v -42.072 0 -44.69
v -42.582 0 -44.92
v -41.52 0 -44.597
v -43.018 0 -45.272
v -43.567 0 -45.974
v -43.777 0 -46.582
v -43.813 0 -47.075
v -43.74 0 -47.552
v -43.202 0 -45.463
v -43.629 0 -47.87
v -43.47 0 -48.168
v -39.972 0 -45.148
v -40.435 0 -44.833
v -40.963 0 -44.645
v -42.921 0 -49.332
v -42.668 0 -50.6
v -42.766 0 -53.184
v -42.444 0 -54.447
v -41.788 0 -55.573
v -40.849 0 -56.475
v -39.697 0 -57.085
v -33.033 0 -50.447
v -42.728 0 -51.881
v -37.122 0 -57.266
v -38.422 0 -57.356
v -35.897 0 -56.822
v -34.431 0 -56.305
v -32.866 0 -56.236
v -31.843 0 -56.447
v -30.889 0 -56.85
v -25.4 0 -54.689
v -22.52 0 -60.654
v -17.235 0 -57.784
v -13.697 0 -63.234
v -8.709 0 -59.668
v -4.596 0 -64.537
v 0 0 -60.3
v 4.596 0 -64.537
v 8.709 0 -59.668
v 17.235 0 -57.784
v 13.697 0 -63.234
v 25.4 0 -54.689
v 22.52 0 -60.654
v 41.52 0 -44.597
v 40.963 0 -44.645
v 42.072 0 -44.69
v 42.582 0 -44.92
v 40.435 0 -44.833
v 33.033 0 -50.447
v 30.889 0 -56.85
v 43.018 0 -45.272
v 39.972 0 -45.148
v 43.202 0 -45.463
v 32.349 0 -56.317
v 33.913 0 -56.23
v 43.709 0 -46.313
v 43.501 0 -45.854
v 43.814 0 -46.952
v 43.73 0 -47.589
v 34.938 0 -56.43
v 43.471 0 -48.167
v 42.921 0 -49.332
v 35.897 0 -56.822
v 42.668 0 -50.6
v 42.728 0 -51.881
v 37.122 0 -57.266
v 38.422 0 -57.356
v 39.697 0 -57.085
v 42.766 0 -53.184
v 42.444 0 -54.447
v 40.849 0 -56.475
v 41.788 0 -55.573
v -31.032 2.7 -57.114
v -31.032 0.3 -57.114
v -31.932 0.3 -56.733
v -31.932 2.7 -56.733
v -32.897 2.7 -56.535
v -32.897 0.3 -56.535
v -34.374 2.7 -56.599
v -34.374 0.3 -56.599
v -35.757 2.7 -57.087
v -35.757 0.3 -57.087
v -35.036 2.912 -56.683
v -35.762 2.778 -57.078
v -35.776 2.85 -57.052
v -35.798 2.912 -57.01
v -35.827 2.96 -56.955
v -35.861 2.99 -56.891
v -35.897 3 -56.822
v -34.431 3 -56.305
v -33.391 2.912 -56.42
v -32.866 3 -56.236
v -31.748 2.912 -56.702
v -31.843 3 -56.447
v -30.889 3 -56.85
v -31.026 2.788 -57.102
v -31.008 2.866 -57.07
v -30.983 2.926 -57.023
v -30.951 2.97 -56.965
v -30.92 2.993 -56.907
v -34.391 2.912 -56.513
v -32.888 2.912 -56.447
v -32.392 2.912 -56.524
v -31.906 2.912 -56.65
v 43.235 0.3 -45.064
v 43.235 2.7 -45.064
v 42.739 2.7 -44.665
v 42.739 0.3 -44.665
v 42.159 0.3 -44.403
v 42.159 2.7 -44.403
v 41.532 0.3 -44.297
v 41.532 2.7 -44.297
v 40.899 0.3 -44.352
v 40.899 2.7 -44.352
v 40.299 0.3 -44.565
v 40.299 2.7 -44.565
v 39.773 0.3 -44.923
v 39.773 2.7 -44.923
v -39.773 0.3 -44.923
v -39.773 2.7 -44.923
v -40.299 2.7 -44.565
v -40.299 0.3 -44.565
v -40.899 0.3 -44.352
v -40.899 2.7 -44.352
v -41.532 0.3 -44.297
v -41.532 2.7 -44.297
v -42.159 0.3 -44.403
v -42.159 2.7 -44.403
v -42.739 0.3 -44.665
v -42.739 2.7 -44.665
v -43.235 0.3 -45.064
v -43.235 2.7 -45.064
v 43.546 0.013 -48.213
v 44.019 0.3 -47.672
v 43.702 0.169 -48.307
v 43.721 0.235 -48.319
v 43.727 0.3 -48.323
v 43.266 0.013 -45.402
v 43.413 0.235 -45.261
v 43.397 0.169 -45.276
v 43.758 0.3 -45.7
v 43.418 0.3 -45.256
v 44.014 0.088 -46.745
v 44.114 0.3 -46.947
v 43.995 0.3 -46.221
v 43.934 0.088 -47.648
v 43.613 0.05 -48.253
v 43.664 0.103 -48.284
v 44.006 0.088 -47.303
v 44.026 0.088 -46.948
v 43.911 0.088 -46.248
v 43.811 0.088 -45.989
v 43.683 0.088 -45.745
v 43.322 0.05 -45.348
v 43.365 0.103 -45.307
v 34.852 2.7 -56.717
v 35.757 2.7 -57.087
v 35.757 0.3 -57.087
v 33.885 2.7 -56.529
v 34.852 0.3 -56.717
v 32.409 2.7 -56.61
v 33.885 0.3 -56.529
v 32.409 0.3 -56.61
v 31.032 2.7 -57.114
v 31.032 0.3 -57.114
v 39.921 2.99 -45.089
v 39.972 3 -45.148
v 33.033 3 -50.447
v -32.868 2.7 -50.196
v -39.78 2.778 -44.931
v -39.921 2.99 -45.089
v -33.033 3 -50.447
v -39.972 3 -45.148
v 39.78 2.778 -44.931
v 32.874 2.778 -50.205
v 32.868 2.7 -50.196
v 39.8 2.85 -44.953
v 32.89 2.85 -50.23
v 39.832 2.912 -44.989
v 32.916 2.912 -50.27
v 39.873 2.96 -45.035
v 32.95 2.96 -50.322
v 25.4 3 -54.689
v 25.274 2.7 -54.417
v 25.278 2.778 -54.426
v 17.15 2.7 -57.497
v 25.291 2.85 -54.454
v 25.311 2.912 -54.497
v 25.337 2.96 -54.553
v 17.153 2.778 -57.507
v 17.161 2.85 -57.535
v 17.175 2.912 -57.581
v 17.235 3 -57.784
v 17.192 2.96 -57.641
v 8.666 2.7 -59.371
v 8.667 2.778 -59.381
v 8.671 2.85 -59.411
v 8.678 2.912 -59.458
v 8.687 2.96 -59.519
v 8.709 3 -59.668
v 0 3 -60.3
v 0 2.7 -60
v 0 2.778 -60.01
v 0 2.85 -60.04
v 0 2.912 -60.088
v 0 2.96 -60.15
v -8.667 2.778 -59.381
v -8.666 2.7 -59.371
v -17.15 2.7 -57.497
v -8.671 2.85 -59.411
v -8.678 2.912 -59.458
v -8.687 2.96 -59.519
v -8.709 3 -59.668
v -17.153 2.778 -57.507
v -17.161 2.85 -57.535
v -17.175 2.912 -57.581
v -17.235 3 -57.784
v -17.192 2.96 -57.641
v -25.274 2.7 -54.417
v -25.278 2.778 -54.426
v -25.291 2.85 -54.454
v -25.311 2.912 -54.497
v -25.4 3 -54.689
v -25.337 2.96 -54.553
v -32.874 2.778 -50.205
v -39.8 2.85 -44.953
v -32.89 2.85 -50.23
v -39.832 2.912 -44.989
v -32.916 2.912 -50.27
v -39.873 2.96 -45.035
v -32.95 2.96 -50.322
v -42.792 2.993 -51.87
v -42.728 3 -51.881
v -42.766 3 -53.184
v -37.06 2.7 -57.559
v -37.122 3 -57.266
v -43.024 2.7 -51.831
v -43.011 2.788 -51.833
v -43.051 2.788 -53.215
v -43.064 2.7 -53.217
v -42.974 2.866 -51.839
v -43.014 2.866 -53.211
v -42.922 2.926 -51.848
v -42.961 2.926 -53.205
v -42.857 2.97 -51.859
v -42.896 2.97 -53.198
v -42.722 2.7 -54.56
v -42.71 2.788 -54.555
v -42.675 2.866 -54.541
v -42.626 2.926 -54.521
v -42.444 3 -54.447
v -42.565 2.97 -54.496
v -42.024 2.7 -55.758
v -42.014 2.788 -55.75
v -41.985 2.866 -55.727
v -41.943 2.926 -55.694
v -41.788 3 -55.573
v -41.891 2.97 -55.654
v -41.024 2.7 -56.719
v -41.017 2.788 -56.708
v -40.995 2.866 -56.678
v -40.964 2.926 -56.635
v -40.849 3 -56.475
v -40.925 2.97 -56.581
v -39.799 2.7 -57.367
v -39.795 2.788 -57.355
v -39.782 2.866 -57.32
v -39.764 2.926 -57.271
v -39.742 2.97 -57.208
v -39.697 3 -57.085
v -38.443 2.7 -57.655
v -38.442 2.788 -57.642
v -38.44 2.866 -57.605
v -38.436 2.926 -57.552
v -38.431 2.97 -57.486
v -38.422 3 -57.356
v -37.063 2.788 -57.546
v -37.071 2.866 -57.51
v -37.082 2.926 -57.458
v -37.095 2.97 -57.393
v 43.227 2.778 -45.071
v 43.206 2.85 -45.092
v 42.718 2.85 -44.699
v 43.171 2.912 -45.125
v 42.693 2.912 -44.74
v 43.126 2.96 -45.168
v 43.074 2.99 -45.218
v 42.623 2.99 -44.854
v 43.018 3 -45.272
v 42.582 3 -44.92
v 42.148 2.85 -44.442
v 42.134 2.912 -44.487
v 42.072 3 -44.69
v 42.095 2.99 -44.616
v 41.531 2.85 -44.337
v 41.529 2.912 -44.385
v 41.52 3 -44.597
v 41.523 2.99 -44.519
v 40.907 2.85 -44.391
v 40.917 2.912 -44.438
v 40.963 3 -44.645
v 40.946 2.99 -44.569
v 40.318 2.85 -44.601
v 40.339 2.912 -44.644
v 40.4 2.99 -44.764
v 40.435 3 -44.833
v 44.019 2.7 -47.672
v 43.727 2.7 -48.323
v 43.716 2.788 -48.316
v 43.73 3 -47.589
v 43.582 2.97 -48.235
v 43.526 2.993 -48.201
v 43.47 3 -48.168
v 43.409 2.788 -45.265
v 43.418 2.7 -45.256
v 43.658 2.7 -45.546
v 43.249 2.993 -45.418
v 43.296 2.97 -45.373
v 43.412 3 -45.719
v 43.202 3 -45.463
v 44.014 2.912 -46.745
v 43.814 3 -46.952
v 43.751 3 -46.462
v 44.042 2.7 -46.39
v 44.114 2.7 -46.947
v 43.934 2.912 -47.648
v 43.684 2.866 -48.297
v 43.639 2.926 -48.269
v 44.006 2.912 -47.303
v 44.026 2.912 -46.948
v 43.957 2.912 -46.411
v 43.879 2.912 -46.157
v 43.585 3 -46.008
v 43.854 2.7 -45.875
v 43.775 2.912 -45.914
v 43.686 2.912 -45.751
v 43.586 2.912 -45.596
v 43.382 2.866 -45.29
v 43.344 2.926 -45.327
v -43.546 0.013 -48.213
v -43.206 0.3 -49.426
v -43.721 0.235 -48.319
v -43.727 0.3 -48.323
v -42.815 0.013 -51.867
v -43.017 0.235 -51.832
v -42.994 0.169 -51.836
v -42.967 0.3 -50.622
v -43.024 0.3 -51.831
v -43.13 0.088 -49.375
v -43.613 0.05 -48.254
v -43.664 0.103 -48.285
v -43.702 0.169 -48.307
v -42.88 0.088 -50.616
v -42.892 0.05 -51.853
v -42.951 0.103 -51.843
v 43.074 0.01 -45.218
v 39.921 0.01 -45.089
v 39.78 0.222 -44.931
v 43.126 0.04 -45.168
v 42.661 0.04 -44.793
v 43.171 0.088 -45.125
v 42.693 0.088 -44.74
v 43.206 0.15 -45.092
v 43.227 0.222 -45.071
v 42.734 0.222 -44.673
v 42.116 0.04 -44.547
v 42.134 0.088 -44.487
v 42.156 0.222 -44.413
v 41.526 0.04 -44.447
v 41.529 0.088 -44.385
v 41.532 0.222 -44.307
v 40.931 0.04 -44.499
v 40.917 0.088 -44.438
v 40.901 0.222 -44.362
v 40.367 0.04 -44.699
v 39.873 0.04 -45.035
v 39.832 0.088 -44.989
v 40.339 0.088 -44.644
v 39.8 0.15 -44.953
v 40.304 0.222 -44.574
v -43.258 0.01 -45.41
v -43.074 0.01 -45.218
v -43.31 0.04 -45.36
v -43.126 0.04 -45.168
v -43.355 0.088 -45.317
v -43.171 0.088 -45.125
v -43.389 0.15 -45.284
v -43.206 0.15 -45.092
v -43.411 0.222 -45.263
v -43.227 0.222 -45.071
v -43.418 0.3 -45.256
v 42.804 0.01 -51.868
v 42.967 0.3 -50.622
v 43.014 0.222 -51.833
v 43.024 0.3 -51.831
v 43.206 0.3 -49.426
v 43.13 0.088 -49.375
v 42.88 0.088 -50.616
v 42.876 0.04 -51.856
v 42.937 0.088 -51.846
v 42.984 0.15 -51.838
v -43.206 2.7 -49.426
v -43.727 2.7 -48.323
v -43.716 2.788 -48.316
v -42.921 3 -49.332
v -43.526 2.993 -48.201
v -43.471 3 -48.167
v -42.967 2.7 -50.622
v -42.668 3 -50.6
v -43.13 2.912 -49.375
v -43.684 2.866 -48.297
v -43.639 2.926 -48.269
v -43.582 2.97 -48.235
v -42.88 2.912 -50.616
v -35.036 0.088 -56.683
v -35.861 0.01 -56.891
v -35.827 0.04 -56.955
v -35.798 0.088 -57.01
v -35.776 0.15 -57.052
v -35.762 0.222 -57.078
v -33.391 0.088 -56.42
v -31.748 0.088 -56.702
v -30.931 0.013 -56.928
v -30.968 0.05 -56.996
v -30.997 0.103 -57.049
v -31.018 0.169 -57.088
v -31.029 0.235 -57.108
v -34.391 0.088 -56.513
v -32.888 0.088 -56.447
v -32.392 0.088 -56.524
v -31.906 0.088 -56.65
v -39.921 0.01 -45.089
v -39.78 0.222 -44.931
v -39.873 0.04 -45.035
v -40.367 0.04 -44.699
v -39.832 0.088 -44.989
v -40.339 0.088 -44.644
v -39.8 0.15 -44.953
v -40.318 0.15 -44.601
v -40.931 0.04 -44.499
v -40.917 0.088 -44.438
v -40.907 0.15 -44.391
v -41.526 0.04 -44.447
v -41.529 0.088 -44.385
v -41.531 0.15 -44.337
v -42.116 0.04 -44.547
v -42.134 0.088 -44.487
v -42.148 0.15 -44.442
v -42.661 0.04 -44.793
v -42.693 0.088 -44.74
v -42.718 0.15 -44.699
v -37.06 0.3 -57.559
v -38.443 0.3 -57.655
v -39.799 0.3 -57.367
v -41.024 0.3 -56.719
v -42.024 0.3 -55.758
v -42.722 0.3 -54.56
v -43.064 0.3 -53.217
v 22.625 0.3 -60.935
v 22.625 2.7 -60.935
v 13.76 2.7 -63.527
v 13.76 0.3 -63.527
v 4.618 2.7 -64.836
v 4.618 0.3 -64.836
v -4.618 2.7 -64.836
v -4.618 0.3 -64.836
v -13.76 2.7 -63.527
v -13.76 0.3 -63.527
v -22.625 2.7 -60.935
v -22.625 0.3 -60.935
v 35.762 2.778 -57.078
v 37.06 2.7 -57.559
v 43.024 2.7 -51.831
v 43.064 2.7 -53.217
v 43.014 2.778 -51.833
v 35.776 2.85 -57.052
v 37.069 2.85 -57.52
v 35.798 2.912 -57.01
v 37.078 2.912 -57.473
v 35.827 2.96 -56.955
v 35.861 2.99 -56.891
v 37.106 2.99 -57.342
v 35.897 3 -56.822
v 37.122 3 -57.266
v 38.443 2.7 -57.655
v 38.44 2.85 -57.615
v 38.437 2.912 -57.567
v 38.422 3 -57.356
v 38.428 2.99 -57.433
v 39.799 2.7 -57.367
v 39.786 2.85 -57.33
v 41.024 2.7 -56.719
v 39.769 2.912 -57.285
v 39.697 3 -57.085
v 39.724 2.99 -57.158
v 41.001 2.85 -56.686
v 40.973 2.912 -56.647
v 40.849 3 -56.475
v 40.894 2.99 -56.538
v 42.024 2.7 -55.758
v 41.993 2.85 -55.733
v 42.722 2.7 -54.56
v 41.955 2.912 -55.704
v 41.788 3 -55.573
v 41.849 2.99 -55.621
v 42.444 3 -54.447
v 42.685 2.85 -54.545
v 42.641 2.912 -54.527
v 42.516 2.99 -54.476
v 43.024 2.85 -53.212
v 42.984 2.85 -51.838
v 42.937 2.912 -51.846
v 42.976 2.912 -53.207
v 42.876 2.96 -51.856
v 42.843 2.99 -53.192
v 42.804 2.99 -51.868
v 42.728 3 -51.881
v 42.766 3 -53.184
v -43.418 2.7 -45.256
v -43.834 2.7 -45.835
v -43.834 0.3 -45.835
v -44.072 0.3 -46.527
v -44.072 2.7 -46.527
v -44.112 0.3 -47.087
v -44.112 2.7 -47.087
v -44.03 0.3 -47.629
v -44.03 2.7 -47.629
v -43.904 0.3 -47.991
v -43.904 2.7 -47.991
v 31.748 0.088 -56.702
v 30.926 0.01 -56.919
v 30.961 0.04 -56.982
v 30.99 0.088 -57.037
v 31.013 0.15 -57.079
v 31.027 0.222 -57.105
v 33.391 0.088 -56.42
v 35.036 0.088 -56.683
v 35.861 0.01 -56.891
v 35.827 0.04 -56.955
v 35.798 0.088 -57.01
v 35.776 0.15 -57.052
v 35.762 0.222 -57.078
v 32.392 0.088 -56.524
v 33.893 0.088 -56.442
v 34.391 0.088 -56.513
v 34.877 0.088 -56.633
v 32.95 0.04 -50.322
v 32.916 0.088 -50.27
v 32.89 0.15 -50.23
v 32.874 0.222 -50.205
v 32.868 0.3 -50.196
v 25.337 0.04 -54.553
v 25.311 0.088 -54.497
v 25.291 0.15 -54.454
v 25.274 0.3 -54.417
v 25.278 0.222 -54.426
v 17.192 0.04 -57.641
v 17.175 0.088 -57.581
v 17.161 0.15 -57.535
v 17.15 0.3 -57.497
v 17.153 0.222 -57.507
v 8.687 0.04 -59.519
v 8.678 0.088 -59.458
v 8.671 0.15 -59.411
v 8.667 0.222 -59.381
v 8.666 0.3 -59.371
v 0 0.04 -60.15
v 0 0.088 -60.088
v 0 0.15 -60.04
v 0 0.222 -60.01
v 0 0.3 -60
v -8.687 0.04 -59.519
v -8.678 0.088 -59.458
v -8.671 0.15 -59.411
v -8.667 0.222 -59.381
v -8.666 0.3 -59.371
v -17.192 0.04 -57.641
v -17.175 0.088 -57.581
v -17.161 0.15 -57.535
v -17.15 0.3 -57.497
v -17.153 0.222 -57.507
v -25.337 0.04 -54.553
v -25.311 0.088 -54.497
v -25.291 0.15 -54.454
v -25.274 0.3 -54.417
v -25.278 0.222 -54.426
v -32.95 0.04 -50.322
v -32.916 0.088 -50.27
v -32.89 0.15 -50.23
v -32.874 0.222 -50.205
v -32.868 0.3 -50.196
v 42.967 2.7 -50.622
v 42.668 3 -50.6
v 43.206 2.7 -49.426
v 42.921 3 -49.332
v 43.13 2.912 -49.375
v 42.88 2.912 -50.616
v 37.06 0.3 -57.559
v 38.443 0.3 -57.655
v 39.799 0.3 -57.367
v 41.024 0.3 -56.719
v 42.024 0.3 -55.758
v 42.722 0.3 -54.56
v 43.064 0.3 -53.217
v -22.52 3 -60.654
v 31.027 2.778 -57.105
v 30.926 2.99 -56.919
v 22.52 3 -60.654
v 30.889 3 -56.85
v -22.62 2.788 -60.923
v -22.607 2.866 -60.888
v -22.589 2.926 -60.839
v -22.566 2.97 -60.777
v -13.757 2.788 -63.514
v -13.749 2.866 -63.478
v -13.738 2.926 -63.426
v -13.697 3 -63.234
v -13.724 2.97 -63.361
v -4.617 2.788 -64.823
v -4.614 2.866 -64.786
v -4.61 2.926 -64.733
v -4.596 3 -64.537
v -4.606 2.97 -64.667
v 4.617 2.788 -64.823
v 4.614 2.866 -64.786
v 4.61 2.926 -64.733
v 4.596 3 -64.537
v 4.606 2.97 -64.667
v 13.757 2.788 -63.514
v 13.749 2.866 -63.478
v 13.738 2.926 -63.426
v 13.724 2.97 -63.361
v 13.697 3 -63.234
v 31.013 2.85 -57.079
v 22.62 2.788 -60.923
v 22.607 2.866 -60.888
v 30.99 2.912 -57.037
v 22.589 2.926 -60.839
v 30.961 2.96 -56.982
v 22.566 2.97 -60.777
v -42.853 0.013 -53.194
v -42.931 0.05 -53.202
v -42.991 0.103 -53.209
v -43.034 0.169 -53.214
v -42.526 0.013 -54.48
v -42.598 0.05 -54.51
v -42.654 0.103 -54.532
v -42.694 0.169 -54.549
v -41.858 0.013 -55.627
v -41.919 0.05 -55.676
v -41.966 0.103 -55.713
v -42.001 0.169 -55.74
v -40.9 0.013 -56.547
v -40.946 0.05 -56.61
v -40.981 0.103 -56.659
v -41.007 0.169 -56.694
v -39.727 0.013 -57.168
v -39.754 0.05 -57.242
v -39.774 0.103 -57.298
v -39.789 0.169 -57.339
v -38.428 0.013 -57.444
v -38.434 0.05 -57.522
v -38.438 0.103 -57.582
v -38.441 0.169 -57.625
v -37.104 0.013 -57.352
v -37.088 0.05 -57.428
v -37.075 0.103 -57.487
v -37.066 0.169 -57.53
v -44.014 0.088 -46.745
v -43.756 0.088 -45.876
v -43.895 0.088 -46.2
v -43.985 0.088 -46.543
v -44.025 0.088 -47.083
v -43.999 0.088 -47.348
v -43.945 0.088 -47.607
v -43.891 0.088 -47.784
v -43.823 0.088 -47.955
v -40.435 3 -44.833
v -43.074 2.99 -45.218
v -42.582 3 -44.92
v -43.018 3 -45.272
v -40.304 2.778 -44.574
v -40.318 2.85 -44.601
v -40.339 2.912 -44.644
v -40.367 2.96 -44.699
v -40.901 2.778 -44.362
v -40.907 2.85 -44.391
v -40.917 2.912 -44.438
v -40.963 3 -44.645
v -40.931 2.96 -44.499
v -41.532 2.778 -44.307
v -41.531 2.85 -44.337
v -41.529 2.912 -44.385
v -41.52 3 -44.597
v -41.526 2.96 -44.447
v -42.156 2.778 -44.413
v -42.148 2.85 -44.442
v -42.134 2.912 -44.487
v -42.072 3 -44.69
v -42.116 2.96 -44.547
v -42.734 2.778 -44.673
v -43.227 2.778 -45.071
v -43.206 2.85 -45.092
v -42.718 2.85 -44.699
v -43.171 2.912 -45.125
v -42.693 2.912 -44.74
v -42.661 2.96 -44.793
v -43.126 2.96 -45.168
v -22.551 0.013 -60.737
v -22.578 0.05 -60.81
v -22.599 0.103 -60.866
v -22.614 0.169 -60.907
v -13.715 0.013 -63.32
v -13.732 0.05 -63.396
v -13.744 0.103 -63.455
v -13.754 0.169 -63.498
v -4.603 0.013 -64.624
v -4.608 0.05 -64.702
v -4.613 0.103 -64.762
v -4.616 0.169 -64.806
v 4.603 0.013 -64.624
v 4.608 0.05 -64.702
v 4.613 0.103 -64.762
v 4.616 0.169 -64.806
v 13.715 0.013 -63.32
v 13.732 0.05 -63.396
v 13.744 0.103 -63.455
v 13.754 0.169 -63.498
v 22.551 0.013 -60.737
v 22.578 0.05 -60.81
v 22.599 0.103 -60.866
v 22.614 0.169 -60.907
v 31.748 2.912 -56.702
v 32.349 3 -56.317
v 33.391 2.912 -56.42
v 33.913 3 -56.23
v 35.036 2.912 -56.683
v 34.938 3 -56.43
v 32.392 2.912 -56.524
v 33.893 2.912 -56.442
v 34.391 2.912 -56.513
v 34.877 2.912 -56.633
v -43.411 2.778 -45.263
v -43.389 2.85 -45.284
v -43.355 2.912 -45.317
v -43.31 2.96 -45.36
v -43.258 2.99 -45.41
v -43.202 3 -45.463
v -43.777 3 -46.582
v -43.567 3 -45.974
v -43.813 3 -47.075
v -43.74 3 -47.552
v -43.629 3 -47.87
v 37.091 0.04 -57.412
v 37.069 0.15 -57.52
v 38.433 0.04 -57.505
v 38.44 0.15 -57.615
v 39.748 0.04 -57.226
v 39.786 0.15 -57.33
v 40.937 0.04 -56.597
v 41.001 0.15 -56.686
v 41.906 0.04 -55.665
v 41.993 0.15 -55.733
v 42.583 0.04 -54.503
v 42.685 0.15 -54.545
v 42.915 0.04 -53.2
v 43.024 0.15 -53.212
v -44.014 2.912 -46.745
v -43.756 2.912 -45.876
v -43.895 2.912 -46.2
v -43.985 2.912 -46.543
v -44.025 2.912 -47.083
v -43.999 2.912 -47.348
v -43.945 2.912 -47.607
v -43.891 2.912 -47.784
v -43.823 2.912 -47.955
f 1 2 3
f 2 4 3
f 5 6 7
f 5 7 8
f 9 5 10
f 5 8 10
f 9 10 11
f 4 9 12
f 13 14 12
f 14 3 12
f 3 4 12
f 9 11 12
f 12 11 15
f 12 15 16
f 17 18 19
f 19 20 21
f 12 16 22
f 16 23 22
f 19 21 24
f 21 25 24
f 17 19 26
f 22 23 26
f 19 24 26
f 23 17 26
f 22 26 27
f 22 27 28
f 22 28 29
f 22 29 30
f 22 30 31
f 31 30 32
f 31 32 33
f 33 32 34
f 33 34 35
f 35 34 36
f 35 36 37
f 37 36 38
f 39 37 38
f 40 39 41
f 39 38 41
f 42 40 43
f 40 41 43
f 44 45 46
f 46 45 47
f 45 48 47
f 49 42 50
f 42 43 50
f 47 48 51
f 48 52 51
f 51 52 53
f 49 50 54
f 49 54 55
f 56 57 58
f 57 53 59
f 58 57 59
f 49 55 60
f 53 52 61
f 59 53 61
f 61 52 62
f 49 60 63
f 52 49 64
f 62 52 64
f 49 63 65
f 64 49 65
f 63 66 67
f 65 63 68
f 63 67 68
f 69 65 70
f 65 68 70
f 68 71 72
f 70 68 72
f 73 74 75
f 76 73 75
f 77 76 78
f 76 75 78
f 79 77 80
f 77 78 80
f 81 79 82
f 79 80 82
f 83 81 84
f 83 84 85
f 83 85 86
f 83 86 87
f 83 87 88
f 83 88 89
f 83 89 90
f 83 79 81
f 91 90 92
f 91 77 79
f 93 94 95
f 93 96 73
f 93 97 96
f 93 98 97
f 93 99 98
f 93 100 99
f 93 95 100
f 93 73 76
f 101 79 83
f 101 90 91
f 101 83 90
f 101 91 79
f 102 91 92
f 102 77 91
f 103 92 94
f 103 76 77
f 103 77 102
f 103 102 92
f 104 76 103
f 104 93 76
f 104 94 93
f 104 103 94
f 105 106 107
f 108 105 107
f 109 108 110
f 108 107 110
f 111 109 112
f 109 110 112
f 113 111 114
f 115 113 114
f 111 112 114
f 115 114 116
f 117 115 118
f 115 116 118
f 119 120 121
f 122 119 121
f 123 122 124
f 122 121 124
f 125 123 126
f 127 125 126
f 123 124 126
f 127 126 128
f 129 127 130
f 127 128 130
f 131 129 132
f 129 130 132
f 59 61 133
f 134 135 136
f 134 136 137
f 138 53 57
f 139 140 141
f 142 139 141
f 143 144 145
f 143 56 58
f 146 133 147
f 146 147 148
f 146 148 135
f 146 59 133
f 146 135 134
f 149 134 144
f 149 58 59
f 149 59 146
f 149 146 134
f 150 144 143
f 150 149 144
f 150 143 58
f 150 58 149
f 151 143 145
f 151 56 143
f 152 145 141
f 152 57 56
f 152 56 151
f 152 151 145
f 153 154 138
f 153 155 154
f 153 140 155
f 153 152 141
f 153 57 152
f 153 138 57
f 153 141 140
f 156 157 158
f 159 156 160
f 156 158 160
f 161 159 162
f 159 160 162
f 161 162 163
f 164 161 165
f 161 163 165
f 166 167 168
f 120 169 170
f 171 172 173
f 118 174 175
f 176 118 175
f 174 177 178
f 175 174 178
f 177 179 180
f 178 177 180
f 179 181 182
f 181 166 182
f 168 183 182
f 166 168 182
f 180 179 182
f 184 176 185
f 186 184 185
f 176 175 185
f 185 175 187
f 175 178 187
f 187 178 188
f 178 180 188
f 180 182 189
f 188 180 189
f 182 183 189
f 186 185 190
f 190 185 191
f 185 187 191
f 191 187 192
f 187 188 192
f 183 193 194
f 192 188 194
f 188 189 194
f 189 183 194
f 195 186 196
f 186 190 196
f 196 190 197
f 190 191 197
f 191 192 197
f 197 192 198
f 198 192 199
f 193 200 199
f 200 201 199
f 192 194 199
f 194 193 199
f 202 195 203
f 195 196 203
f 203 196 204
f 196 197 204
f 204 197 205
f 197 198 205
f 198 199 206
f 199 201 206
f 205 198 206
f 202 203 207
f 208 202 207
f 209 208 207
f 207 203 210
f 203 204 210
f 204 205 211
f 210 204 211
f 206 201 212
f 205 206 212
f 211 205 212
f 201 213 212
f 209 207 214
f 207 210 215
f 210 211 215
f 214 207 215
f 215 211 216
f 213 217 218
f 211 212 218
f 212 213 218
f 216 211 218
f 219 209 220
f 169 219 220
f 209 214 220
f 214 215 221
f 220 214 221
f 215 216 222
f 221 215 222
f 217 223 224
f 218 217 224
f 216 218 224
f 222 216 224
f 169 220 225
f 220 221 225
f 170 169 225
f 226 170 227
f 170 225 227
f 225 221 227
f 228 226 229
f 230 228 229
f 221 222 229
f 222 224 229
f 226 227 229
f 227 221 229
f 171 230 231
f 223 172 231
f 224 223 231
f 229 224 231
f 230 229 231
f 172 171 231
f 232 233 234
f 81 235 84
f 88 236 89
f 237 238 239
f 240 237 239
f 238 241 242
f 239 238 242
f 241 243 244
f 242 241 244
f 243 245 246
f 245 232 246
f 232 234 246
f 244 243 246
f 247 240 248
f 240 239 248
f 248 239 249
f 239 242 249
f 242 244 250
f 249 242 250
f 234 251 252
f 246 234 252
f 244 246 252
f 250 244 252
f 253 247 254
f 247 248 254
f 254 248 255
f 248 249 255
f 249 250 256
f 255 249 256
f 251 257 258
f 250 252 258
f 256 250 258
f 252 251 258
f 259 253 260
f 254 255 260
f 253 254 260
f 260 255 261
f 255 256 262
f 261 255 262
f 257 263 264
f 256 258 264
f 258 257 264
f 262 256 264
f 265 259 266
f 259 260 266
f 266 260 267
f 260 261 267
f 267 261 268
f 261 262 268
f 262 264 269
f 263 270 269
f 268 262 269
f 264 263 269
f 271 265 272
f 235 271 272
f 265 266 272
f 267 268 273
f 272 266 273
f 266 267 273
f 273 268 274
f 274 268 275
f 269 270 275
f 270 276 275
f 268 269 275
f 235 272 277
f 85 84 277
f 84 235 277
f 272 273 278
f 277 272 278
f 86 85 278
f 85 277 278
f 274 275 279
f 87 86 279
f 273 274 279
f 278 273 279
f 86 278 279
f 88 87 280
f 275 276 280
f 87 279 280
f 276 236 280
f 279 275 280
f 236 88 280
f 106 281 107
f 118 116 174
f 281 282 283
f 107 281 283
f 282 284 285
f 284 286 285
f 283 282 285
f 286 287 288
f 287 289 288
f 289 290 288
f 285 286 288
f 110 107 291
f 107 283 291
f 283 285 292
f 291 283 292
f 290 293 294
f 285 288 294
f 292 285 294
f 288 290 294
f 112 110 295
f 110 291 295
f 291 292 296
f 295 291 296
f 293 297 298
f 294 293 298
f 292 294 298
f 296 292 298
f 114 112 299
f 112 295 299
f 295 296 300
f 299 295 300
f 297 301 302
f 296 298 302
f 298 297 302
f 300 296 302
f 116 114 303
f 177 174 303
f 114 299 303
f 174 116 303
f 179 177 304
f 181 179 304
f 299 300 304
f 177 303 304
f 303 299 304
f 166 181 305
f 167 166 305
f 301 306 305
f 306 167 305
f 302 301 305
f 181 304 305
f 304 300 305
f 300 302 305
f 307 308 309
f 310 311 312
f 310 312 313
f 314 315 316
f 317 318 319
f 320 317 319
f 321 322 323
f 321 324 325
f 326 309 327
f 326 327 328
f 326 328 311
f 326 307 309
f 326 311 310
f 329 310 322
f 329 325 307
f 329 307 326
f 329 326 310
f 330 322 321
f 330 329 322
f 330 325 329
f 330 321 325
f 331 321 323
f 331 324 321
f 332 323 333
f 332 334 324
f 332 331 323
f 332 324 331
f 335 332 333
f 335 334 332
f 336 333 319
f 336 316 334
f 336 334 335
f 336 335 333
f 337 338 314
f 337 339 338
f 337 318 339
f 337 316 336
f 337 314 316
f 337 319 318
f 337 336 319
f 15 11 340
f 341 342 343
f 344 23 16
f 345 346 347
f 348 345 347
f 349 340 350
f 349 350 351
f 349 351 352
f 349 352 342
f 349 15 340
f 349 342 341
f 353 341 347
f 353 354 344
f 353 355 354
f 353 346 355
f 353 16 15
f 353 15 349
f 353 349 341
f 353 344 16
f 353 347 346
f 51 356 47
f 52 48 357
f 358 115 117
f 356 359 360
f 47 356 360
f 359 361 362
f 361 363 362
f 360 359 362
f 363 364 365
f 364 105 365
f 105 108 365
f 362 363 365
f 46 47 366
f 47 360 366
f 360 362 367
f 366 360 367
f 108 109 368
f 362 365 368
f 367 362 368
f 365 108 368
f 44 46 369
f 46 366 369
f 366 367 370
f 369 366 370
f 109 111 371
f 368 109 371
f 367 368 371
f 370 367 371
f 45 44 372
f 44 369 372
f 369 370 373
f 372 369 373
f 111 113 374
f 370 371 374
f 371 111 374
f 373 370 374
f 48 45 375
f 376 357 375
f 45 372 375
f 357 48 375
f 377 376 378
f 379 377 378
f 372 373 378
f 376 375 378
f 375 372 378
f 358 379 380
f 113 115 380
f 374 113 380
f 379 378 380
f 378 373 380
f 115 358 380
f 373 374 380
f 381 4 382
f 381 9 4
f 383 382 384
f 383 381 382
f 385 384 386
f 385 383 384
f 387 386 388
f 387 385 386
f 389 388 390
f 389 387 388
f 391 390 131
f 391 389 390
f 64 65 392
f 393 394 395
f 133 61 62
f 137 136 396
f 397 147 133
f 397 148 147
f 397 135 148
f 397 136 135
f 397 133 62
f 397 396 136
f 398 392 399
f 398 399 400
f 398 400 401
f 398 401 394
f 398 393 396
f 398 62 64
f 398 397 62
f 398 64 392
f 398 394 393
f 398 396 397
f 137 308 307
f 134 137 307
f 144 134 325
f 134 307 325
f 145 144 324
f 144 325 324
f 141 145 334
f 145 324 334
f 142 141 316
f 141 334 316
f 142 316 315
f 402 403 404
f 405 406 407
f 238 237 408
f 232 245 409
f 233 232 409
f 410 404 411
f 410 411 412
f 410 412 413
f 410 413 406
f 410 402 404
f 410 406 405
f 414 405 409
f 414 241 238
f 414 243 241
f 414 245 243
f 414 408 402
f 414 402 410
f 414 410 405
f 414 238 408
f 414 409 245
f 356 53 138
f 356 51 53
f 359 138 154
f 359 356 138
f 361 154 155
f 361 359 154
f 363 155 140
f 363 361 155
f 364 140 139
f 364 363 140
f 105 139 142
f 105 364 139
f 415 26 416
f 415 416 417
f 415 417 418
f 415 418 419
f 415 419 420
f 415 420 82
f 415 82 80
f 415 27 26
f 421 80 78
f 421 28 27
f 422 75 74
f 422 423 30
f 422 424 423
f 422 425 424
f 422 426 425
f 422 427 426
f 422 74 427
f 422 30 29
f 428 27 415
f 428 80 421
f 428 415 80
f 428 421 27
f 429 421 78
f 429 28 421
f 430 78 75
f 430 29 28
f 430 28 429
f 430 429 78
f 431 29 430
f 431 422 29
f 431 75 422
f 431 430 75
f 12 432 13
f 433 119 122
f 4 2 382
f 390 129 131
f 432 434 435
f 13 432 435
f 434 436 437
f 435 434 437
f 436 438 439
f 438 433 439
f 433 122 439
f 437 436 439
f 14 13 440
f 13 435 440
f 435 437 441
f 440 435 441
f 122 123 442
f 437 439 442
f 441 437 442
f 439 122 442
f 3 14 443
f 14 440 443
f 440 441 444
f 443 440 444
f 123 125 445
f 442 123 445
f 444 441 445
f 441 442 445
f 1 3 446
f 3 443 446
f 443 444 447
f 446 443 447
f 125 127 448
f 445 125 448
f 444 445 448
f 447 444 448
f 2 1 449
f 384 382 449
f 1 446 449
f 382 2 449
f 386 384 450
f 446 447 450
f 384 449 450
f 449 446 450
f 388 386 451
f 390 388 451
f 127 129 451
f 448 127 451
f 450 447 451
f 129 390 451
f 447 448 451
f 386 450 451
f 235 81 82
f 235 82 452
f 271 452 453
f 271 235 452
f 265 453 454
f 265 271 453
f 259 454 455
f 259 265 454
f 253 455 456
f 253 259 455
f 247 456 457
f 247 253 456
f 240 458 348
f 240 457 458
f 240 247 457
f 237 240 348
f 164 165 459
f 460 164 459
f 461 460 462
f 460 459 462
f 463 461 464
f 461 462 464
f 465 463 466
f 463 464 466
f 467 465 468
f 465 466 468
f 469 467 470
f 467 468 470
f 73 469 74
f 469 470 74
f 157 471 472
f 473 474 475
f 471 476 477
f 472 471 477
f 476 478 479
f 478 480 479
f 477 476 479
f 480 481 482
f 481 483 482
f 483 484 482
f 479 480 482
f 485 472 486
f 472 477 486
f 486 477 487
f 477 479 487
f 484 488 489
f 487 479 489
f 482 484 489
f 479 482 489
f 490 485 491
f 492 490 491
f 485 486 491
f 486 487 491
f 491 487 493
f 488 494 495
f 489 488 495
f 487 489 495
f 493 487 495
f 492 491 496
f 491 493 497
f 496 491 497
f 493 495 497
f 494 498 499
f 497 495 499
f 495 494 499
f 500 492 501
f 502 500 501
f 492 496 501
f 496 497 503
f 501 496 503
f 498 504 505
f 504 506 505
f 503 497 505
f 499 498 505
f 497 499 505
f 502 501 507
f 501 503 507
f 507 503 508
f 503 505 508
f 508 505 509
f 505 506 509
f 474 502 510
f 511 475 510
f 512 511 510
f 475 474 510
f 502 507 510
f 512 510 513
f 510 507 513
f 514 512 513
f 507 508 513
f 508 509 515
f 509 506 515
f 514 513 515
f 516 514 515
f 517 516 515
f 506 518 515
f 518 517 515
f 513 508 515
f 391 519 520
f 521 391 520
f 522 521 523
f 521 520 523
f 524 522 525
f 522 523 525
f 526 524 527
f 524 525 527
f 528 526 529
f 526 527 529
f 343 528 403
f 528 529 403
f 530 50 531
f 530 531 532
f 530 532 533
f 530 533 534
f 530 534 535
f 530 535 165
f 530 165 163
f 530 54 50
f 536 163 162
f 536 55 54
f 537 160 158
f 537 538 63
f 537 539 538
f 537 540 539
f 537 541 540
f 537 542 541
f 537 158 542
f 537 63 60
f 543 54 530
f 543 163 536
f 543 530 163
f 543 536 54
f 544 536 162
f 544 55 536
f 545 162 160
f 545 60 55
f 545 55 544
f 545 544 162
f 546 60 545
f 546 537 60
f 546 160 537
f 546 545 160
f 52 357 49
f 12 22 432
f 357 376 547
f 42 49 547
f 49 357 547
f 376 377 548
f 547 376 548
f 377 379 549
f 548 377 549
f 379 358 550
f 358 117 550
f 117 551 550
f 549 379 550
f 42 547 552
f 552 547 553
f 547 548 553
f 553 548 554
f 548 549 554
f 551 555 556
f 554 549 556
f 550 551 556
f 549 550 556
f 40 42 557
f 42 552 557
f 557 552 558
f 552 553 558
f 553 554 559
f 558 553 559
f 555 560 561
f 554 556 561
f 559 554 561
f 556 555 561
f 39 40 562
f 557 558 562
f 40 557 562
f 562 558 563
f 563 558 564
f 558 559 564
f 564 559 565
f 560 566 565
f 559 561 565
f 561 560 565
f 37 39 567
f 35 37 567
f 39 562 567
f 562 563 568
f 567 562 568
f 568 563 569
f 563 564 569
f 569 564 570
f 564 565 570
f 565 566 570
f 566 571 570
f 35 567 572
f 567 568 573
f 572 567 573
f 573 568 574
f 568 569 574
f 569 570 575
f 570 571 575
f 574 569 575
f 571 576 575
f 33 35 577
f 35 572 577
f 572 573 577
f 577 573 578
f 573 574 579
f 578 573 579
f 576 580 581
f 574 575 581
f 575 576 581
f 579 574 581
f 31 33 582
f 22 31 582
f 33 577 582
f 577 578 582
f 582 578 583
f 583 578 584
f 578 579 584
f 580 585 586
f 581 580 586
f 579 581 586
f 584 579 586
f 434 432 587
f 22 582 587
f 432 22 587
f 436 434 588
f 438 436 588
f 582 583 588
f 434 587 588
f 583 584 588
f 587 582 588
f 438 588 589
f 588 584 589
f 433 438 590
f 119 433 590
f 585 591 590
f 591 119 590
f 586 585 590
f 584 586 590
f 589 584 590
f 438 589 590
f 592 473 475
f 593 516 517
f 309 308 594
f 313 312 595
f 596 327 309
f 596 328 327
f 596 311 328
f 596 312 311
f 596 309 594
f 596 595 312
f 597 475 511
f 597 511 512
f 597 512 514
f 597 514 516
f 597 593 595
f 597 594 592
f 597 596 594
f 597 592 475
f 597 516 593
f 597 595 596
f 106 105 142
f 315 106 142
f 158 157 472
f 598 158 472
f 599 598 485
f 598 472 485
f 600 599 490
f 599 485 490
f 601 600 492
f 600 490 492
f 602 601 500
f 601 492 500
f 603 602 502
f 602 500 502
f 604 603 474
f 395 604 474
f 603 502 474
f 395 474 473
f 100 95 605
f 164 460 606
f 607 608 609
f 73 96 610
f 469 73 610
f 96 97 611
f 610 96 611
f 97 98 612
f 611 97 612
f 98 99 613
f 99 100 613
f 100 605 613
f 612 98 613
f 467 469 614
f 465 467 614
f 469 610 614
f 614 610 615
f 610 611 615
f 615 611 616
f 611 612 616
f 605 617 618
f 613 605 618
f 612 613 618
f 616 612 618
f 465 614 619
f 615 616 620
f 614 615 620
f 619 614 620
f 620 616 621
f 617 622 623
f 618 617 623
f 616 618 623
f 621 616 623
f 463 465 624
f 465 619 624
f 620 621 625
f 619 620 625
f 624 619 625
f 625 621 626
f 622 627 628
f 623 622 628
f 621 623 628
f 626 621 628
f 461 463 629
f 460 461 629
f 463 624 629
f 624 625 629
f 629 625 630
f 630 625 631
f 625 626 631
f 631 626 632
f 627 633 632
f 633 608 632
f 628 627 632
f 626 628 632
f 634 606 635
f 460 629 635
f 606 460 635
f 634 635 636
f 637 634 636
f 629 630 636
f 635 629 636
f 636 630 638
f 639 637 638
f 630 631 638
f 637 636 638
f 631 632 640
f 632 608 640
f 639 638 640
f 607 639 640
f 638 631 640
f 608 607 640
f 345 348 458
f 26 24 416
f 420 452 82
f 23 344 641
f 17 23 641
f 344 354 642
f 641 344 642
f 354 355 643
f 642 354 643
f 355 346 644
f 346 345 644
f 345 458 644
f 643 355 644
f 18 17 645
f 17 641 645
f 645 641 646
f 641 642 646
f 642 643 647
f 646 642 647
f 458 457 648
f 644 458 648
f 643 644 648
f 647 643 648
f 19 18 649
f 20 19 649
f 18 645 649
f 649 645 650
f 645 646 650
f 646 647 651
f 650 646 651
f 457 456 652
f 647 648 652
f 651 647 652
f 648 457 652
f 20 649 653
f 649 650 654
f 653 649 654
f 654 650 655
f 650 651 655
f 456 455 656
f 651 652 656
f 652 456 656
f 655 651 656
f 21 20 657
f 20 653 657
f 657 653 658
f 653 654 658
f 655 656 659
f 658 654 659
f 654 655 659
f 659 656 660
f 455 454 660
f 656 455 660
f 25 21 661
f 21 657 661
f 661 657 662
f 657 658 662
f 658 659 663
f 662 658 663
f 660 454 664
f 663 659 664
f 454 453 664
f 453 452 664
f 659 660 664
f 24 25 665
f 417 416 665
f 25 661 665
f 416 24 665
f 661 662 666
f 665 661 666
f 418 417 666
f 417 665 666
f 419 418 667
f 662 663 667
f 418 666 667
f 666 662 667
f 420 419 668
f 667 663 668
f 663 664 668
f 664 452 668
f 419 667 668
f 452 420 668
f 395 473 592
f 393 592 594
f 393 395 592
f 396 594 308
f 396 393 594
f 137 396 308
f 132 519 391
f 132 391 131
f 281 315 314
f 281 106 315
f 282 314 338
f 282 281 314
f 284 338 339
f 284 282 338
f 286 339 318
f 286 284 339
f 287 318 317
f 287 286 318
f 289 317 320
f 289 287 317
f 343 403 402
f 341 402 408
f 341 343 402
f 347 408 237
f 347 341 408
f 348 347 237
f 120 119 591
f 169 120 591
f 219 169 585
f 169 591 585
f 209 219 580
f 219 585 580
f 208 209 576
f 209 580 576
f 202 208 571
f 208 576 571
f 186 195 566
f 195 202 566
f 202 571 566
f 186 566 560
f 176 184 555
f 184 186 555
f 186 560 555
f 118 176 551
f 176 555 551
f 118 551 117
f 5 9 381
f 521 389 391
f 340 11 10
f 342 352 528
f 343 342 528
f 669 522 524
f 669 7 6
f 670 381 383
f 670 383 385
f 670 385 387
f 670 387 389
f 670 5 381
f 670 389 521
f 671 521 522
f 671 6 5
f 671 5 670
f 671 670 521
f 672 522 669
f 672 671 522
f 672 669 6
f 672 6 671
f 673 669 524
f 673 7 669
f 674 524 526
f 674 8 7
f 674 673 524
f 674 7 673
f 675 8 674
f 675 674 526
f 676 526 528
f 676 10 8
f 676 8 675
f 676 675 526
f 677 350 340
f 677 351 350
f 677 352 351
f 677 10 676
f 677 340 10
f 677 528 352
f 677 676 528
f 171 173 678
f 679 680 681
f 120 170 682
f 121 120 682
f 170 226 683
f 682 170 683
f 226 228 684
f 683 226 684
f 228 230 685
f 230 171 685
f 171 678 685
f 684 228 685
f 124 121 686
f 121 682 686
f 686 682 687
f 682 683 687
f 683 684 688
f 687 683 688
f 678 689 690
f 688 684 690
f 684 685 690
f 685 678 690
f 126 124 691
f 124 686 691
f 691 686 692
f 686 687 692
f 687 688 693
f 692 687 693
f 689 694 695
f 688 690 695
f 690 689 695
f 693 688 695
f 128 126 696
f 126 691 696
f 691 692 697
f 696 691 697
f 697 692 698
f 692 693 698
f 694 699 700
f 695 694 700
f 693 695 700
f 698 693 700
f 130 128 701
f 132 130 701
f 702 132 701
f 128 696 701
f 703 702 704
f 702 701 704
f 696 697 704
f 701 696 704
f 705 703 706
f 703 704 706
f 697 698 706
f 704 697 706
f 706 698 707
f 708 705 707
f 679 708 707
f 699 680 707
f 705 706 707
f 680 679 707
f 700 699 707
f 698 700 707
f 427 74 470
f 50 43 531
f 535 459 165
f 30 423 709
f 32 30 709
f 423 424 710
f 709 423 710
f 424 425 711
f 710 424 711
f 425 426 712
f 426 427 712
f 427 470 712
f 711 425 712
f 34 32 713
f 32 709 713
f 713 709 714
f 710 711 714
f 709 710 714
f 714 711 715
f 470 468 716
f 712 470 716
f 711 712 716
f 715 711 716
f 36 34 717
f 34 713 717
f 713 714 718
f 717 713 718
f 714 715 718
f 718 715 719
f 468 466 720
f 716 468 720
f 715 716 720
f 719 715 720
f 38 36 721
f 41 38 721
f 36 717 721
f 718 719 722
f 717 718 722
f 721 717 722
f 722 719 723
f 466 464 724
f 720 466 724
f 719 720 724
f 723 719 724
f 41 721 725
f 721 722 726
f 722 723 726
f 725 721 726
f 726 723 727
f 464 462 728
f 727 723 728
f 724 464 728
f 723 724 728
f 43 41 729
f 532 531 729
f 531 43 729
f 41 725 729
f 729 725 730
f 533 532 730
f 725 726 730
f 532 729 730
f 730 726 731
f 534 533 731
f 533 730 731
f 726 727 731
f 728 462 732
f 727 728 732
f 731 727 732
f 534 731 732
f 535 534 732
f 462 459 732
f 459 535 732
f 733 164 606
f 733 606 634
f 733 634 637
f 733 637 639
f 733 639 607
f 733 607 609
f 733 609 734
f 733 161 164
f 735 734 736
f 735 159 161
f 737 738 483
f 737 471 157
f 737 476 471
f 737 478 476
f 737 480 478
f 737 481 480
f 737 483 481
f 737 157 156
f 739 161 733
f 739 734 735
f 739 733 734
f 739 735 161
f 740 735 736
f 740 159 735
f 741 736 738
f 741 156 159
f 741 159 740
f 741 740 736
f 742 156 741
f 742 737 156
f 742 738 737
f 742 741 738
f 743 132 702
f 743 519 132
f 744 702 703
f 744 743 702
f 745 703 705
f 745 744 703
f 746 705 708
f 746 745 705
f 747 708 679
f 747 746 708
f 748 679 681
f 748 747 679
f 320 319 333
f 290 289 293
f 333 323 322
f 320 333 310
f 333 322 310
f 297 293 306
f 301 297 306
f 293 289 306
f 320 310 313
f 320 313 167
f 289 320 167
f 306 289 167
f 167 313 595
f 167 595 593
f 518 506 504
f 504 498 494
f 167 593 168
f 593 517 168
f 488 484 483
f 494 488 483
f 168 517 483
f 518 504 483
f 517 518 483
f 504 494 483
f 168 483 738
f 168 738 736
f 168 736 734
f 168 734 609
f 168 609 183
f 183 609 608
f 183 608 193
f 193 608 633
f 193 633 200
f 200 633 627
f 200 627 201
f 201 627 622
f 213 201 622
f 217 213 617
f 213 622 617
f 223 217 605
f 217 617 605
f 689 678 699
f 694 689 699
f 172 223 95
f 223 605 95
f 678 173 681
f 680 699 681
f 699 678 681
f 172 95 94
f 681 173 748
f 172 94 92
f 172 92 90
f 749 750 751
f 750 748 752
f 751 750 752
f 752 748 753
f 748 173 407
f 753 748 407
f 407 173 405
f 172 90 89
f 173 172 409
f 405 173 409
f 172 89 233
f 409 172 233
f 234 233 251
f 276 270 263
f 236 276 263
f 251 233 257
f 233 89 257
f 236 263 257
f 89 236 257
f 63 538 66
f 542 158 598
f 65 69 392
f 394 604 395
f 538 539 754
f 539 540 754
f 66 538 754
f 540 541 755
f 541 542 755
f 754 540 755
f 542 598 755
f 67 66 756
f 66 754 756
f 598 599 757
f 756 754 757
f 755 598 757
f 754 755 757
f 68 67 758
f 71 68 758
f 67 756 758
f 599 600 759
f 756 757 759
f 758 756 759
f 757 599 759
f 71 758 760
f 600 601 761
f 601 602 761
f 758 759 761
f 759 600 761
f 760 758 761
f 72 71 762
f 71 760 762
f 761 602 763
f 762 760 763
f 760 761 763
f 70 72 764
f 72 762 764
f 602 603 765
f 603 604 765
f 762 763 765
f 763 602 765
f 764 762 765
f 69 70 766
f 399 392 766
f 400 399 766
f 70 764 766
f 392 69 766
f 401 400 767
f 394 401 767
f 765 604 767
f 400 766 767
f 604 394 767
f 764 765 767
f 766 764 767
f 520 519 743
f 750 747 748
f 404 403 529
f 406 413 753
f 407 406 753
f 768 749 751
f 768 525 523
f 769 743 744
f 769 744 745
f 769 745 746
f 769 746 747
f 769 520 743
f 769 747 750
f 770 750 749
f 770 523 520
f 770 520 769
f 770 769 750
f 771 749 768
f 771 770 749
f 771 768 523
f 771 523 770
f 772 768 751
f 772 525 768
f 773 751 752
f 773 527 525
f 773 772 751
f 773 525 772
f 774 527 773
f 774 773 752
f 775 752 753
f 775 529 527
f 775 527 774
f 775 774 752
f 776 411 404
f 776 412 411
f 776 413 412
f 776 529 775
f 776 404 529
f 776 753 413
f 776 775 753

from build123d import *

# Parameters (mm, degrees)
EXTRUDE_1_DEPTH = 3
EXTRUDE_2_DEPTH = 3
FILLET_3_R      = 5
FILLET_1_R      = 2.5
FILLET_2_R      = 0.3


with BuildPart() as part:
    # Эскиз1 → Бобышка-Вытянуть1 (new body)
    with BuildSketch(Plane(origin=(0, 0, 0), x_dir=(1, 0, 0), z_dir=(0, 1, 0))):
        with BuildLine():
            Line((-45, 46.904157598234306), (-41.53846153846153, 43.29614547529319))
            ThreePointArc((-41.53846153846153, 43.29614547529319), (3.67e-15, 60), (41.53846153846155, 43.29614547529319))
            Line((41.53846153846155, 43.29614547529319), (45, 46.904157598234306))
            ThreePointArc((45, 46.904157598234306), (3.98e-15, 65.00000000000001), (-45, 46.904157598234306))
        make_face()
    extrude(amount=EXTRUDE_1_DEPTH)

    # Эскиз2 → Бобышка-Вытянуть2 (add)
    with BuildSketch(Plane(origin=(0, 3, 0), x_dir=(1, 0, 0), z_dir=(0, 1, 0))):
        with BuildLine():
            Line((-42.02974987239072, 49.583264572477226), (-33.93309379020482, 55.439563001751424))
            ThreePointArc((-33.93309379020482, 55.439563001751424), (-41.02444375843438, 56.71855969884159), (-42.02974987239072, 49.583264572477226))
        make_face()
    extrude_2 = extrude(amount=-EXTRUDE_2_DEPTH)

    # Зеркальное отражение1: Бобышка-Вытянуть2 across plane
    add(extrude_2.mirror(Plane(origin=(0, 0, 0), x_dir=(0, 0, 1), z_dir=(1, 0, 0))))

    # Скругление3
    fillet_3_edges = [part.edges().sort_by_distance(p)[0] for p in [
        (-42.02974987239072, 1.5, -49.583264572477226),
        (-33.93309379020482, 1.5, -55.439563001751424),
        (42.02974987239072, 1.5, -49.583264572477226),
        (33.93309379020482, 1.5, -55.439563001751424),
    ]]
    fillet(fillet_3_edges, radius=FILLET_3_R)

    # Скругление1
    fillet_1_edges = [part.edges().sort_by_distance(p)[0] for p in [
        (-45.00000000000001, 1.5, -46.904157598234306),
        (-41.53846153846153, 1.5, -43.29614547529319),
        (45, 1.5, -46.904157598234306),
        (41.53846153846155, 1.5, -43.29614547529319),
    ]]
    fillet(fillet_1_edges, radius=FILLET_1_R - 0.0001)  # a hair under: the kernel refuses the full size

    # Скругление2
    fillet_2_edges = [part.edges().sort_by_distance(p)[0] for p in [
        (41.02444375843438, 0, -56.71855969884159),
        (41.02444375843438, 3, -56.71855969884159),
        (7.11e-15, 0, -65.00000000000001),
        (7.11e-15, 3, -65.00000000000001),
        (-41.02444375843439, 0, -56.71855969884159),
        (-41.02444375843439, 3, -56.71855969884159),
        (43.05092646297095, 0, -50.01169135950295),
        (33.39115614651435, 3, -56.5073672828282),
        (33.39115614651436, 0, -56.5073672828282),
        (-33.39115614651442, 3, -56.507367282828206),
        (-33.39115614651442, 0, -56.507367282828206),
        (-43.05092646297095, 3, -50.01169135950294),
        (-43.32649192788036, 0, -45.15983567919837),
        (-43.32649192788036, 3, -45.15983567919837),
        (43.32649192788038, 0, -45.15983567919839),
        (0, 0, -60),
        (-43.05092646297095, 0, -50.01169135950294),
        (41.53237029407291, 0, -44.296859977676405),
        (44.10182670999084, 0, -46.73582398498882),
        (-41.532370294072905, 0, -44.29685997767639),
        (-44.10182670999084, 0, -46.7358239849889),
        (43.050926462970956, 3, -50.01169135950295),
        (0, 3, -60),
        (43.32649192788038, 3, -45.15983567919839),
        (41.53237029407291, 3, -44.296859977676405),
        (44.10182670999084, 3, -46.73582398498882),
        (-41.532370294072905, 3, -44.29685997767639),
        (-44.10182670999083, 3, -46.735823984988905),
    ]]
    fillet(fillet_2_edges, radius=FILLET_2_R)


solid = part.part
